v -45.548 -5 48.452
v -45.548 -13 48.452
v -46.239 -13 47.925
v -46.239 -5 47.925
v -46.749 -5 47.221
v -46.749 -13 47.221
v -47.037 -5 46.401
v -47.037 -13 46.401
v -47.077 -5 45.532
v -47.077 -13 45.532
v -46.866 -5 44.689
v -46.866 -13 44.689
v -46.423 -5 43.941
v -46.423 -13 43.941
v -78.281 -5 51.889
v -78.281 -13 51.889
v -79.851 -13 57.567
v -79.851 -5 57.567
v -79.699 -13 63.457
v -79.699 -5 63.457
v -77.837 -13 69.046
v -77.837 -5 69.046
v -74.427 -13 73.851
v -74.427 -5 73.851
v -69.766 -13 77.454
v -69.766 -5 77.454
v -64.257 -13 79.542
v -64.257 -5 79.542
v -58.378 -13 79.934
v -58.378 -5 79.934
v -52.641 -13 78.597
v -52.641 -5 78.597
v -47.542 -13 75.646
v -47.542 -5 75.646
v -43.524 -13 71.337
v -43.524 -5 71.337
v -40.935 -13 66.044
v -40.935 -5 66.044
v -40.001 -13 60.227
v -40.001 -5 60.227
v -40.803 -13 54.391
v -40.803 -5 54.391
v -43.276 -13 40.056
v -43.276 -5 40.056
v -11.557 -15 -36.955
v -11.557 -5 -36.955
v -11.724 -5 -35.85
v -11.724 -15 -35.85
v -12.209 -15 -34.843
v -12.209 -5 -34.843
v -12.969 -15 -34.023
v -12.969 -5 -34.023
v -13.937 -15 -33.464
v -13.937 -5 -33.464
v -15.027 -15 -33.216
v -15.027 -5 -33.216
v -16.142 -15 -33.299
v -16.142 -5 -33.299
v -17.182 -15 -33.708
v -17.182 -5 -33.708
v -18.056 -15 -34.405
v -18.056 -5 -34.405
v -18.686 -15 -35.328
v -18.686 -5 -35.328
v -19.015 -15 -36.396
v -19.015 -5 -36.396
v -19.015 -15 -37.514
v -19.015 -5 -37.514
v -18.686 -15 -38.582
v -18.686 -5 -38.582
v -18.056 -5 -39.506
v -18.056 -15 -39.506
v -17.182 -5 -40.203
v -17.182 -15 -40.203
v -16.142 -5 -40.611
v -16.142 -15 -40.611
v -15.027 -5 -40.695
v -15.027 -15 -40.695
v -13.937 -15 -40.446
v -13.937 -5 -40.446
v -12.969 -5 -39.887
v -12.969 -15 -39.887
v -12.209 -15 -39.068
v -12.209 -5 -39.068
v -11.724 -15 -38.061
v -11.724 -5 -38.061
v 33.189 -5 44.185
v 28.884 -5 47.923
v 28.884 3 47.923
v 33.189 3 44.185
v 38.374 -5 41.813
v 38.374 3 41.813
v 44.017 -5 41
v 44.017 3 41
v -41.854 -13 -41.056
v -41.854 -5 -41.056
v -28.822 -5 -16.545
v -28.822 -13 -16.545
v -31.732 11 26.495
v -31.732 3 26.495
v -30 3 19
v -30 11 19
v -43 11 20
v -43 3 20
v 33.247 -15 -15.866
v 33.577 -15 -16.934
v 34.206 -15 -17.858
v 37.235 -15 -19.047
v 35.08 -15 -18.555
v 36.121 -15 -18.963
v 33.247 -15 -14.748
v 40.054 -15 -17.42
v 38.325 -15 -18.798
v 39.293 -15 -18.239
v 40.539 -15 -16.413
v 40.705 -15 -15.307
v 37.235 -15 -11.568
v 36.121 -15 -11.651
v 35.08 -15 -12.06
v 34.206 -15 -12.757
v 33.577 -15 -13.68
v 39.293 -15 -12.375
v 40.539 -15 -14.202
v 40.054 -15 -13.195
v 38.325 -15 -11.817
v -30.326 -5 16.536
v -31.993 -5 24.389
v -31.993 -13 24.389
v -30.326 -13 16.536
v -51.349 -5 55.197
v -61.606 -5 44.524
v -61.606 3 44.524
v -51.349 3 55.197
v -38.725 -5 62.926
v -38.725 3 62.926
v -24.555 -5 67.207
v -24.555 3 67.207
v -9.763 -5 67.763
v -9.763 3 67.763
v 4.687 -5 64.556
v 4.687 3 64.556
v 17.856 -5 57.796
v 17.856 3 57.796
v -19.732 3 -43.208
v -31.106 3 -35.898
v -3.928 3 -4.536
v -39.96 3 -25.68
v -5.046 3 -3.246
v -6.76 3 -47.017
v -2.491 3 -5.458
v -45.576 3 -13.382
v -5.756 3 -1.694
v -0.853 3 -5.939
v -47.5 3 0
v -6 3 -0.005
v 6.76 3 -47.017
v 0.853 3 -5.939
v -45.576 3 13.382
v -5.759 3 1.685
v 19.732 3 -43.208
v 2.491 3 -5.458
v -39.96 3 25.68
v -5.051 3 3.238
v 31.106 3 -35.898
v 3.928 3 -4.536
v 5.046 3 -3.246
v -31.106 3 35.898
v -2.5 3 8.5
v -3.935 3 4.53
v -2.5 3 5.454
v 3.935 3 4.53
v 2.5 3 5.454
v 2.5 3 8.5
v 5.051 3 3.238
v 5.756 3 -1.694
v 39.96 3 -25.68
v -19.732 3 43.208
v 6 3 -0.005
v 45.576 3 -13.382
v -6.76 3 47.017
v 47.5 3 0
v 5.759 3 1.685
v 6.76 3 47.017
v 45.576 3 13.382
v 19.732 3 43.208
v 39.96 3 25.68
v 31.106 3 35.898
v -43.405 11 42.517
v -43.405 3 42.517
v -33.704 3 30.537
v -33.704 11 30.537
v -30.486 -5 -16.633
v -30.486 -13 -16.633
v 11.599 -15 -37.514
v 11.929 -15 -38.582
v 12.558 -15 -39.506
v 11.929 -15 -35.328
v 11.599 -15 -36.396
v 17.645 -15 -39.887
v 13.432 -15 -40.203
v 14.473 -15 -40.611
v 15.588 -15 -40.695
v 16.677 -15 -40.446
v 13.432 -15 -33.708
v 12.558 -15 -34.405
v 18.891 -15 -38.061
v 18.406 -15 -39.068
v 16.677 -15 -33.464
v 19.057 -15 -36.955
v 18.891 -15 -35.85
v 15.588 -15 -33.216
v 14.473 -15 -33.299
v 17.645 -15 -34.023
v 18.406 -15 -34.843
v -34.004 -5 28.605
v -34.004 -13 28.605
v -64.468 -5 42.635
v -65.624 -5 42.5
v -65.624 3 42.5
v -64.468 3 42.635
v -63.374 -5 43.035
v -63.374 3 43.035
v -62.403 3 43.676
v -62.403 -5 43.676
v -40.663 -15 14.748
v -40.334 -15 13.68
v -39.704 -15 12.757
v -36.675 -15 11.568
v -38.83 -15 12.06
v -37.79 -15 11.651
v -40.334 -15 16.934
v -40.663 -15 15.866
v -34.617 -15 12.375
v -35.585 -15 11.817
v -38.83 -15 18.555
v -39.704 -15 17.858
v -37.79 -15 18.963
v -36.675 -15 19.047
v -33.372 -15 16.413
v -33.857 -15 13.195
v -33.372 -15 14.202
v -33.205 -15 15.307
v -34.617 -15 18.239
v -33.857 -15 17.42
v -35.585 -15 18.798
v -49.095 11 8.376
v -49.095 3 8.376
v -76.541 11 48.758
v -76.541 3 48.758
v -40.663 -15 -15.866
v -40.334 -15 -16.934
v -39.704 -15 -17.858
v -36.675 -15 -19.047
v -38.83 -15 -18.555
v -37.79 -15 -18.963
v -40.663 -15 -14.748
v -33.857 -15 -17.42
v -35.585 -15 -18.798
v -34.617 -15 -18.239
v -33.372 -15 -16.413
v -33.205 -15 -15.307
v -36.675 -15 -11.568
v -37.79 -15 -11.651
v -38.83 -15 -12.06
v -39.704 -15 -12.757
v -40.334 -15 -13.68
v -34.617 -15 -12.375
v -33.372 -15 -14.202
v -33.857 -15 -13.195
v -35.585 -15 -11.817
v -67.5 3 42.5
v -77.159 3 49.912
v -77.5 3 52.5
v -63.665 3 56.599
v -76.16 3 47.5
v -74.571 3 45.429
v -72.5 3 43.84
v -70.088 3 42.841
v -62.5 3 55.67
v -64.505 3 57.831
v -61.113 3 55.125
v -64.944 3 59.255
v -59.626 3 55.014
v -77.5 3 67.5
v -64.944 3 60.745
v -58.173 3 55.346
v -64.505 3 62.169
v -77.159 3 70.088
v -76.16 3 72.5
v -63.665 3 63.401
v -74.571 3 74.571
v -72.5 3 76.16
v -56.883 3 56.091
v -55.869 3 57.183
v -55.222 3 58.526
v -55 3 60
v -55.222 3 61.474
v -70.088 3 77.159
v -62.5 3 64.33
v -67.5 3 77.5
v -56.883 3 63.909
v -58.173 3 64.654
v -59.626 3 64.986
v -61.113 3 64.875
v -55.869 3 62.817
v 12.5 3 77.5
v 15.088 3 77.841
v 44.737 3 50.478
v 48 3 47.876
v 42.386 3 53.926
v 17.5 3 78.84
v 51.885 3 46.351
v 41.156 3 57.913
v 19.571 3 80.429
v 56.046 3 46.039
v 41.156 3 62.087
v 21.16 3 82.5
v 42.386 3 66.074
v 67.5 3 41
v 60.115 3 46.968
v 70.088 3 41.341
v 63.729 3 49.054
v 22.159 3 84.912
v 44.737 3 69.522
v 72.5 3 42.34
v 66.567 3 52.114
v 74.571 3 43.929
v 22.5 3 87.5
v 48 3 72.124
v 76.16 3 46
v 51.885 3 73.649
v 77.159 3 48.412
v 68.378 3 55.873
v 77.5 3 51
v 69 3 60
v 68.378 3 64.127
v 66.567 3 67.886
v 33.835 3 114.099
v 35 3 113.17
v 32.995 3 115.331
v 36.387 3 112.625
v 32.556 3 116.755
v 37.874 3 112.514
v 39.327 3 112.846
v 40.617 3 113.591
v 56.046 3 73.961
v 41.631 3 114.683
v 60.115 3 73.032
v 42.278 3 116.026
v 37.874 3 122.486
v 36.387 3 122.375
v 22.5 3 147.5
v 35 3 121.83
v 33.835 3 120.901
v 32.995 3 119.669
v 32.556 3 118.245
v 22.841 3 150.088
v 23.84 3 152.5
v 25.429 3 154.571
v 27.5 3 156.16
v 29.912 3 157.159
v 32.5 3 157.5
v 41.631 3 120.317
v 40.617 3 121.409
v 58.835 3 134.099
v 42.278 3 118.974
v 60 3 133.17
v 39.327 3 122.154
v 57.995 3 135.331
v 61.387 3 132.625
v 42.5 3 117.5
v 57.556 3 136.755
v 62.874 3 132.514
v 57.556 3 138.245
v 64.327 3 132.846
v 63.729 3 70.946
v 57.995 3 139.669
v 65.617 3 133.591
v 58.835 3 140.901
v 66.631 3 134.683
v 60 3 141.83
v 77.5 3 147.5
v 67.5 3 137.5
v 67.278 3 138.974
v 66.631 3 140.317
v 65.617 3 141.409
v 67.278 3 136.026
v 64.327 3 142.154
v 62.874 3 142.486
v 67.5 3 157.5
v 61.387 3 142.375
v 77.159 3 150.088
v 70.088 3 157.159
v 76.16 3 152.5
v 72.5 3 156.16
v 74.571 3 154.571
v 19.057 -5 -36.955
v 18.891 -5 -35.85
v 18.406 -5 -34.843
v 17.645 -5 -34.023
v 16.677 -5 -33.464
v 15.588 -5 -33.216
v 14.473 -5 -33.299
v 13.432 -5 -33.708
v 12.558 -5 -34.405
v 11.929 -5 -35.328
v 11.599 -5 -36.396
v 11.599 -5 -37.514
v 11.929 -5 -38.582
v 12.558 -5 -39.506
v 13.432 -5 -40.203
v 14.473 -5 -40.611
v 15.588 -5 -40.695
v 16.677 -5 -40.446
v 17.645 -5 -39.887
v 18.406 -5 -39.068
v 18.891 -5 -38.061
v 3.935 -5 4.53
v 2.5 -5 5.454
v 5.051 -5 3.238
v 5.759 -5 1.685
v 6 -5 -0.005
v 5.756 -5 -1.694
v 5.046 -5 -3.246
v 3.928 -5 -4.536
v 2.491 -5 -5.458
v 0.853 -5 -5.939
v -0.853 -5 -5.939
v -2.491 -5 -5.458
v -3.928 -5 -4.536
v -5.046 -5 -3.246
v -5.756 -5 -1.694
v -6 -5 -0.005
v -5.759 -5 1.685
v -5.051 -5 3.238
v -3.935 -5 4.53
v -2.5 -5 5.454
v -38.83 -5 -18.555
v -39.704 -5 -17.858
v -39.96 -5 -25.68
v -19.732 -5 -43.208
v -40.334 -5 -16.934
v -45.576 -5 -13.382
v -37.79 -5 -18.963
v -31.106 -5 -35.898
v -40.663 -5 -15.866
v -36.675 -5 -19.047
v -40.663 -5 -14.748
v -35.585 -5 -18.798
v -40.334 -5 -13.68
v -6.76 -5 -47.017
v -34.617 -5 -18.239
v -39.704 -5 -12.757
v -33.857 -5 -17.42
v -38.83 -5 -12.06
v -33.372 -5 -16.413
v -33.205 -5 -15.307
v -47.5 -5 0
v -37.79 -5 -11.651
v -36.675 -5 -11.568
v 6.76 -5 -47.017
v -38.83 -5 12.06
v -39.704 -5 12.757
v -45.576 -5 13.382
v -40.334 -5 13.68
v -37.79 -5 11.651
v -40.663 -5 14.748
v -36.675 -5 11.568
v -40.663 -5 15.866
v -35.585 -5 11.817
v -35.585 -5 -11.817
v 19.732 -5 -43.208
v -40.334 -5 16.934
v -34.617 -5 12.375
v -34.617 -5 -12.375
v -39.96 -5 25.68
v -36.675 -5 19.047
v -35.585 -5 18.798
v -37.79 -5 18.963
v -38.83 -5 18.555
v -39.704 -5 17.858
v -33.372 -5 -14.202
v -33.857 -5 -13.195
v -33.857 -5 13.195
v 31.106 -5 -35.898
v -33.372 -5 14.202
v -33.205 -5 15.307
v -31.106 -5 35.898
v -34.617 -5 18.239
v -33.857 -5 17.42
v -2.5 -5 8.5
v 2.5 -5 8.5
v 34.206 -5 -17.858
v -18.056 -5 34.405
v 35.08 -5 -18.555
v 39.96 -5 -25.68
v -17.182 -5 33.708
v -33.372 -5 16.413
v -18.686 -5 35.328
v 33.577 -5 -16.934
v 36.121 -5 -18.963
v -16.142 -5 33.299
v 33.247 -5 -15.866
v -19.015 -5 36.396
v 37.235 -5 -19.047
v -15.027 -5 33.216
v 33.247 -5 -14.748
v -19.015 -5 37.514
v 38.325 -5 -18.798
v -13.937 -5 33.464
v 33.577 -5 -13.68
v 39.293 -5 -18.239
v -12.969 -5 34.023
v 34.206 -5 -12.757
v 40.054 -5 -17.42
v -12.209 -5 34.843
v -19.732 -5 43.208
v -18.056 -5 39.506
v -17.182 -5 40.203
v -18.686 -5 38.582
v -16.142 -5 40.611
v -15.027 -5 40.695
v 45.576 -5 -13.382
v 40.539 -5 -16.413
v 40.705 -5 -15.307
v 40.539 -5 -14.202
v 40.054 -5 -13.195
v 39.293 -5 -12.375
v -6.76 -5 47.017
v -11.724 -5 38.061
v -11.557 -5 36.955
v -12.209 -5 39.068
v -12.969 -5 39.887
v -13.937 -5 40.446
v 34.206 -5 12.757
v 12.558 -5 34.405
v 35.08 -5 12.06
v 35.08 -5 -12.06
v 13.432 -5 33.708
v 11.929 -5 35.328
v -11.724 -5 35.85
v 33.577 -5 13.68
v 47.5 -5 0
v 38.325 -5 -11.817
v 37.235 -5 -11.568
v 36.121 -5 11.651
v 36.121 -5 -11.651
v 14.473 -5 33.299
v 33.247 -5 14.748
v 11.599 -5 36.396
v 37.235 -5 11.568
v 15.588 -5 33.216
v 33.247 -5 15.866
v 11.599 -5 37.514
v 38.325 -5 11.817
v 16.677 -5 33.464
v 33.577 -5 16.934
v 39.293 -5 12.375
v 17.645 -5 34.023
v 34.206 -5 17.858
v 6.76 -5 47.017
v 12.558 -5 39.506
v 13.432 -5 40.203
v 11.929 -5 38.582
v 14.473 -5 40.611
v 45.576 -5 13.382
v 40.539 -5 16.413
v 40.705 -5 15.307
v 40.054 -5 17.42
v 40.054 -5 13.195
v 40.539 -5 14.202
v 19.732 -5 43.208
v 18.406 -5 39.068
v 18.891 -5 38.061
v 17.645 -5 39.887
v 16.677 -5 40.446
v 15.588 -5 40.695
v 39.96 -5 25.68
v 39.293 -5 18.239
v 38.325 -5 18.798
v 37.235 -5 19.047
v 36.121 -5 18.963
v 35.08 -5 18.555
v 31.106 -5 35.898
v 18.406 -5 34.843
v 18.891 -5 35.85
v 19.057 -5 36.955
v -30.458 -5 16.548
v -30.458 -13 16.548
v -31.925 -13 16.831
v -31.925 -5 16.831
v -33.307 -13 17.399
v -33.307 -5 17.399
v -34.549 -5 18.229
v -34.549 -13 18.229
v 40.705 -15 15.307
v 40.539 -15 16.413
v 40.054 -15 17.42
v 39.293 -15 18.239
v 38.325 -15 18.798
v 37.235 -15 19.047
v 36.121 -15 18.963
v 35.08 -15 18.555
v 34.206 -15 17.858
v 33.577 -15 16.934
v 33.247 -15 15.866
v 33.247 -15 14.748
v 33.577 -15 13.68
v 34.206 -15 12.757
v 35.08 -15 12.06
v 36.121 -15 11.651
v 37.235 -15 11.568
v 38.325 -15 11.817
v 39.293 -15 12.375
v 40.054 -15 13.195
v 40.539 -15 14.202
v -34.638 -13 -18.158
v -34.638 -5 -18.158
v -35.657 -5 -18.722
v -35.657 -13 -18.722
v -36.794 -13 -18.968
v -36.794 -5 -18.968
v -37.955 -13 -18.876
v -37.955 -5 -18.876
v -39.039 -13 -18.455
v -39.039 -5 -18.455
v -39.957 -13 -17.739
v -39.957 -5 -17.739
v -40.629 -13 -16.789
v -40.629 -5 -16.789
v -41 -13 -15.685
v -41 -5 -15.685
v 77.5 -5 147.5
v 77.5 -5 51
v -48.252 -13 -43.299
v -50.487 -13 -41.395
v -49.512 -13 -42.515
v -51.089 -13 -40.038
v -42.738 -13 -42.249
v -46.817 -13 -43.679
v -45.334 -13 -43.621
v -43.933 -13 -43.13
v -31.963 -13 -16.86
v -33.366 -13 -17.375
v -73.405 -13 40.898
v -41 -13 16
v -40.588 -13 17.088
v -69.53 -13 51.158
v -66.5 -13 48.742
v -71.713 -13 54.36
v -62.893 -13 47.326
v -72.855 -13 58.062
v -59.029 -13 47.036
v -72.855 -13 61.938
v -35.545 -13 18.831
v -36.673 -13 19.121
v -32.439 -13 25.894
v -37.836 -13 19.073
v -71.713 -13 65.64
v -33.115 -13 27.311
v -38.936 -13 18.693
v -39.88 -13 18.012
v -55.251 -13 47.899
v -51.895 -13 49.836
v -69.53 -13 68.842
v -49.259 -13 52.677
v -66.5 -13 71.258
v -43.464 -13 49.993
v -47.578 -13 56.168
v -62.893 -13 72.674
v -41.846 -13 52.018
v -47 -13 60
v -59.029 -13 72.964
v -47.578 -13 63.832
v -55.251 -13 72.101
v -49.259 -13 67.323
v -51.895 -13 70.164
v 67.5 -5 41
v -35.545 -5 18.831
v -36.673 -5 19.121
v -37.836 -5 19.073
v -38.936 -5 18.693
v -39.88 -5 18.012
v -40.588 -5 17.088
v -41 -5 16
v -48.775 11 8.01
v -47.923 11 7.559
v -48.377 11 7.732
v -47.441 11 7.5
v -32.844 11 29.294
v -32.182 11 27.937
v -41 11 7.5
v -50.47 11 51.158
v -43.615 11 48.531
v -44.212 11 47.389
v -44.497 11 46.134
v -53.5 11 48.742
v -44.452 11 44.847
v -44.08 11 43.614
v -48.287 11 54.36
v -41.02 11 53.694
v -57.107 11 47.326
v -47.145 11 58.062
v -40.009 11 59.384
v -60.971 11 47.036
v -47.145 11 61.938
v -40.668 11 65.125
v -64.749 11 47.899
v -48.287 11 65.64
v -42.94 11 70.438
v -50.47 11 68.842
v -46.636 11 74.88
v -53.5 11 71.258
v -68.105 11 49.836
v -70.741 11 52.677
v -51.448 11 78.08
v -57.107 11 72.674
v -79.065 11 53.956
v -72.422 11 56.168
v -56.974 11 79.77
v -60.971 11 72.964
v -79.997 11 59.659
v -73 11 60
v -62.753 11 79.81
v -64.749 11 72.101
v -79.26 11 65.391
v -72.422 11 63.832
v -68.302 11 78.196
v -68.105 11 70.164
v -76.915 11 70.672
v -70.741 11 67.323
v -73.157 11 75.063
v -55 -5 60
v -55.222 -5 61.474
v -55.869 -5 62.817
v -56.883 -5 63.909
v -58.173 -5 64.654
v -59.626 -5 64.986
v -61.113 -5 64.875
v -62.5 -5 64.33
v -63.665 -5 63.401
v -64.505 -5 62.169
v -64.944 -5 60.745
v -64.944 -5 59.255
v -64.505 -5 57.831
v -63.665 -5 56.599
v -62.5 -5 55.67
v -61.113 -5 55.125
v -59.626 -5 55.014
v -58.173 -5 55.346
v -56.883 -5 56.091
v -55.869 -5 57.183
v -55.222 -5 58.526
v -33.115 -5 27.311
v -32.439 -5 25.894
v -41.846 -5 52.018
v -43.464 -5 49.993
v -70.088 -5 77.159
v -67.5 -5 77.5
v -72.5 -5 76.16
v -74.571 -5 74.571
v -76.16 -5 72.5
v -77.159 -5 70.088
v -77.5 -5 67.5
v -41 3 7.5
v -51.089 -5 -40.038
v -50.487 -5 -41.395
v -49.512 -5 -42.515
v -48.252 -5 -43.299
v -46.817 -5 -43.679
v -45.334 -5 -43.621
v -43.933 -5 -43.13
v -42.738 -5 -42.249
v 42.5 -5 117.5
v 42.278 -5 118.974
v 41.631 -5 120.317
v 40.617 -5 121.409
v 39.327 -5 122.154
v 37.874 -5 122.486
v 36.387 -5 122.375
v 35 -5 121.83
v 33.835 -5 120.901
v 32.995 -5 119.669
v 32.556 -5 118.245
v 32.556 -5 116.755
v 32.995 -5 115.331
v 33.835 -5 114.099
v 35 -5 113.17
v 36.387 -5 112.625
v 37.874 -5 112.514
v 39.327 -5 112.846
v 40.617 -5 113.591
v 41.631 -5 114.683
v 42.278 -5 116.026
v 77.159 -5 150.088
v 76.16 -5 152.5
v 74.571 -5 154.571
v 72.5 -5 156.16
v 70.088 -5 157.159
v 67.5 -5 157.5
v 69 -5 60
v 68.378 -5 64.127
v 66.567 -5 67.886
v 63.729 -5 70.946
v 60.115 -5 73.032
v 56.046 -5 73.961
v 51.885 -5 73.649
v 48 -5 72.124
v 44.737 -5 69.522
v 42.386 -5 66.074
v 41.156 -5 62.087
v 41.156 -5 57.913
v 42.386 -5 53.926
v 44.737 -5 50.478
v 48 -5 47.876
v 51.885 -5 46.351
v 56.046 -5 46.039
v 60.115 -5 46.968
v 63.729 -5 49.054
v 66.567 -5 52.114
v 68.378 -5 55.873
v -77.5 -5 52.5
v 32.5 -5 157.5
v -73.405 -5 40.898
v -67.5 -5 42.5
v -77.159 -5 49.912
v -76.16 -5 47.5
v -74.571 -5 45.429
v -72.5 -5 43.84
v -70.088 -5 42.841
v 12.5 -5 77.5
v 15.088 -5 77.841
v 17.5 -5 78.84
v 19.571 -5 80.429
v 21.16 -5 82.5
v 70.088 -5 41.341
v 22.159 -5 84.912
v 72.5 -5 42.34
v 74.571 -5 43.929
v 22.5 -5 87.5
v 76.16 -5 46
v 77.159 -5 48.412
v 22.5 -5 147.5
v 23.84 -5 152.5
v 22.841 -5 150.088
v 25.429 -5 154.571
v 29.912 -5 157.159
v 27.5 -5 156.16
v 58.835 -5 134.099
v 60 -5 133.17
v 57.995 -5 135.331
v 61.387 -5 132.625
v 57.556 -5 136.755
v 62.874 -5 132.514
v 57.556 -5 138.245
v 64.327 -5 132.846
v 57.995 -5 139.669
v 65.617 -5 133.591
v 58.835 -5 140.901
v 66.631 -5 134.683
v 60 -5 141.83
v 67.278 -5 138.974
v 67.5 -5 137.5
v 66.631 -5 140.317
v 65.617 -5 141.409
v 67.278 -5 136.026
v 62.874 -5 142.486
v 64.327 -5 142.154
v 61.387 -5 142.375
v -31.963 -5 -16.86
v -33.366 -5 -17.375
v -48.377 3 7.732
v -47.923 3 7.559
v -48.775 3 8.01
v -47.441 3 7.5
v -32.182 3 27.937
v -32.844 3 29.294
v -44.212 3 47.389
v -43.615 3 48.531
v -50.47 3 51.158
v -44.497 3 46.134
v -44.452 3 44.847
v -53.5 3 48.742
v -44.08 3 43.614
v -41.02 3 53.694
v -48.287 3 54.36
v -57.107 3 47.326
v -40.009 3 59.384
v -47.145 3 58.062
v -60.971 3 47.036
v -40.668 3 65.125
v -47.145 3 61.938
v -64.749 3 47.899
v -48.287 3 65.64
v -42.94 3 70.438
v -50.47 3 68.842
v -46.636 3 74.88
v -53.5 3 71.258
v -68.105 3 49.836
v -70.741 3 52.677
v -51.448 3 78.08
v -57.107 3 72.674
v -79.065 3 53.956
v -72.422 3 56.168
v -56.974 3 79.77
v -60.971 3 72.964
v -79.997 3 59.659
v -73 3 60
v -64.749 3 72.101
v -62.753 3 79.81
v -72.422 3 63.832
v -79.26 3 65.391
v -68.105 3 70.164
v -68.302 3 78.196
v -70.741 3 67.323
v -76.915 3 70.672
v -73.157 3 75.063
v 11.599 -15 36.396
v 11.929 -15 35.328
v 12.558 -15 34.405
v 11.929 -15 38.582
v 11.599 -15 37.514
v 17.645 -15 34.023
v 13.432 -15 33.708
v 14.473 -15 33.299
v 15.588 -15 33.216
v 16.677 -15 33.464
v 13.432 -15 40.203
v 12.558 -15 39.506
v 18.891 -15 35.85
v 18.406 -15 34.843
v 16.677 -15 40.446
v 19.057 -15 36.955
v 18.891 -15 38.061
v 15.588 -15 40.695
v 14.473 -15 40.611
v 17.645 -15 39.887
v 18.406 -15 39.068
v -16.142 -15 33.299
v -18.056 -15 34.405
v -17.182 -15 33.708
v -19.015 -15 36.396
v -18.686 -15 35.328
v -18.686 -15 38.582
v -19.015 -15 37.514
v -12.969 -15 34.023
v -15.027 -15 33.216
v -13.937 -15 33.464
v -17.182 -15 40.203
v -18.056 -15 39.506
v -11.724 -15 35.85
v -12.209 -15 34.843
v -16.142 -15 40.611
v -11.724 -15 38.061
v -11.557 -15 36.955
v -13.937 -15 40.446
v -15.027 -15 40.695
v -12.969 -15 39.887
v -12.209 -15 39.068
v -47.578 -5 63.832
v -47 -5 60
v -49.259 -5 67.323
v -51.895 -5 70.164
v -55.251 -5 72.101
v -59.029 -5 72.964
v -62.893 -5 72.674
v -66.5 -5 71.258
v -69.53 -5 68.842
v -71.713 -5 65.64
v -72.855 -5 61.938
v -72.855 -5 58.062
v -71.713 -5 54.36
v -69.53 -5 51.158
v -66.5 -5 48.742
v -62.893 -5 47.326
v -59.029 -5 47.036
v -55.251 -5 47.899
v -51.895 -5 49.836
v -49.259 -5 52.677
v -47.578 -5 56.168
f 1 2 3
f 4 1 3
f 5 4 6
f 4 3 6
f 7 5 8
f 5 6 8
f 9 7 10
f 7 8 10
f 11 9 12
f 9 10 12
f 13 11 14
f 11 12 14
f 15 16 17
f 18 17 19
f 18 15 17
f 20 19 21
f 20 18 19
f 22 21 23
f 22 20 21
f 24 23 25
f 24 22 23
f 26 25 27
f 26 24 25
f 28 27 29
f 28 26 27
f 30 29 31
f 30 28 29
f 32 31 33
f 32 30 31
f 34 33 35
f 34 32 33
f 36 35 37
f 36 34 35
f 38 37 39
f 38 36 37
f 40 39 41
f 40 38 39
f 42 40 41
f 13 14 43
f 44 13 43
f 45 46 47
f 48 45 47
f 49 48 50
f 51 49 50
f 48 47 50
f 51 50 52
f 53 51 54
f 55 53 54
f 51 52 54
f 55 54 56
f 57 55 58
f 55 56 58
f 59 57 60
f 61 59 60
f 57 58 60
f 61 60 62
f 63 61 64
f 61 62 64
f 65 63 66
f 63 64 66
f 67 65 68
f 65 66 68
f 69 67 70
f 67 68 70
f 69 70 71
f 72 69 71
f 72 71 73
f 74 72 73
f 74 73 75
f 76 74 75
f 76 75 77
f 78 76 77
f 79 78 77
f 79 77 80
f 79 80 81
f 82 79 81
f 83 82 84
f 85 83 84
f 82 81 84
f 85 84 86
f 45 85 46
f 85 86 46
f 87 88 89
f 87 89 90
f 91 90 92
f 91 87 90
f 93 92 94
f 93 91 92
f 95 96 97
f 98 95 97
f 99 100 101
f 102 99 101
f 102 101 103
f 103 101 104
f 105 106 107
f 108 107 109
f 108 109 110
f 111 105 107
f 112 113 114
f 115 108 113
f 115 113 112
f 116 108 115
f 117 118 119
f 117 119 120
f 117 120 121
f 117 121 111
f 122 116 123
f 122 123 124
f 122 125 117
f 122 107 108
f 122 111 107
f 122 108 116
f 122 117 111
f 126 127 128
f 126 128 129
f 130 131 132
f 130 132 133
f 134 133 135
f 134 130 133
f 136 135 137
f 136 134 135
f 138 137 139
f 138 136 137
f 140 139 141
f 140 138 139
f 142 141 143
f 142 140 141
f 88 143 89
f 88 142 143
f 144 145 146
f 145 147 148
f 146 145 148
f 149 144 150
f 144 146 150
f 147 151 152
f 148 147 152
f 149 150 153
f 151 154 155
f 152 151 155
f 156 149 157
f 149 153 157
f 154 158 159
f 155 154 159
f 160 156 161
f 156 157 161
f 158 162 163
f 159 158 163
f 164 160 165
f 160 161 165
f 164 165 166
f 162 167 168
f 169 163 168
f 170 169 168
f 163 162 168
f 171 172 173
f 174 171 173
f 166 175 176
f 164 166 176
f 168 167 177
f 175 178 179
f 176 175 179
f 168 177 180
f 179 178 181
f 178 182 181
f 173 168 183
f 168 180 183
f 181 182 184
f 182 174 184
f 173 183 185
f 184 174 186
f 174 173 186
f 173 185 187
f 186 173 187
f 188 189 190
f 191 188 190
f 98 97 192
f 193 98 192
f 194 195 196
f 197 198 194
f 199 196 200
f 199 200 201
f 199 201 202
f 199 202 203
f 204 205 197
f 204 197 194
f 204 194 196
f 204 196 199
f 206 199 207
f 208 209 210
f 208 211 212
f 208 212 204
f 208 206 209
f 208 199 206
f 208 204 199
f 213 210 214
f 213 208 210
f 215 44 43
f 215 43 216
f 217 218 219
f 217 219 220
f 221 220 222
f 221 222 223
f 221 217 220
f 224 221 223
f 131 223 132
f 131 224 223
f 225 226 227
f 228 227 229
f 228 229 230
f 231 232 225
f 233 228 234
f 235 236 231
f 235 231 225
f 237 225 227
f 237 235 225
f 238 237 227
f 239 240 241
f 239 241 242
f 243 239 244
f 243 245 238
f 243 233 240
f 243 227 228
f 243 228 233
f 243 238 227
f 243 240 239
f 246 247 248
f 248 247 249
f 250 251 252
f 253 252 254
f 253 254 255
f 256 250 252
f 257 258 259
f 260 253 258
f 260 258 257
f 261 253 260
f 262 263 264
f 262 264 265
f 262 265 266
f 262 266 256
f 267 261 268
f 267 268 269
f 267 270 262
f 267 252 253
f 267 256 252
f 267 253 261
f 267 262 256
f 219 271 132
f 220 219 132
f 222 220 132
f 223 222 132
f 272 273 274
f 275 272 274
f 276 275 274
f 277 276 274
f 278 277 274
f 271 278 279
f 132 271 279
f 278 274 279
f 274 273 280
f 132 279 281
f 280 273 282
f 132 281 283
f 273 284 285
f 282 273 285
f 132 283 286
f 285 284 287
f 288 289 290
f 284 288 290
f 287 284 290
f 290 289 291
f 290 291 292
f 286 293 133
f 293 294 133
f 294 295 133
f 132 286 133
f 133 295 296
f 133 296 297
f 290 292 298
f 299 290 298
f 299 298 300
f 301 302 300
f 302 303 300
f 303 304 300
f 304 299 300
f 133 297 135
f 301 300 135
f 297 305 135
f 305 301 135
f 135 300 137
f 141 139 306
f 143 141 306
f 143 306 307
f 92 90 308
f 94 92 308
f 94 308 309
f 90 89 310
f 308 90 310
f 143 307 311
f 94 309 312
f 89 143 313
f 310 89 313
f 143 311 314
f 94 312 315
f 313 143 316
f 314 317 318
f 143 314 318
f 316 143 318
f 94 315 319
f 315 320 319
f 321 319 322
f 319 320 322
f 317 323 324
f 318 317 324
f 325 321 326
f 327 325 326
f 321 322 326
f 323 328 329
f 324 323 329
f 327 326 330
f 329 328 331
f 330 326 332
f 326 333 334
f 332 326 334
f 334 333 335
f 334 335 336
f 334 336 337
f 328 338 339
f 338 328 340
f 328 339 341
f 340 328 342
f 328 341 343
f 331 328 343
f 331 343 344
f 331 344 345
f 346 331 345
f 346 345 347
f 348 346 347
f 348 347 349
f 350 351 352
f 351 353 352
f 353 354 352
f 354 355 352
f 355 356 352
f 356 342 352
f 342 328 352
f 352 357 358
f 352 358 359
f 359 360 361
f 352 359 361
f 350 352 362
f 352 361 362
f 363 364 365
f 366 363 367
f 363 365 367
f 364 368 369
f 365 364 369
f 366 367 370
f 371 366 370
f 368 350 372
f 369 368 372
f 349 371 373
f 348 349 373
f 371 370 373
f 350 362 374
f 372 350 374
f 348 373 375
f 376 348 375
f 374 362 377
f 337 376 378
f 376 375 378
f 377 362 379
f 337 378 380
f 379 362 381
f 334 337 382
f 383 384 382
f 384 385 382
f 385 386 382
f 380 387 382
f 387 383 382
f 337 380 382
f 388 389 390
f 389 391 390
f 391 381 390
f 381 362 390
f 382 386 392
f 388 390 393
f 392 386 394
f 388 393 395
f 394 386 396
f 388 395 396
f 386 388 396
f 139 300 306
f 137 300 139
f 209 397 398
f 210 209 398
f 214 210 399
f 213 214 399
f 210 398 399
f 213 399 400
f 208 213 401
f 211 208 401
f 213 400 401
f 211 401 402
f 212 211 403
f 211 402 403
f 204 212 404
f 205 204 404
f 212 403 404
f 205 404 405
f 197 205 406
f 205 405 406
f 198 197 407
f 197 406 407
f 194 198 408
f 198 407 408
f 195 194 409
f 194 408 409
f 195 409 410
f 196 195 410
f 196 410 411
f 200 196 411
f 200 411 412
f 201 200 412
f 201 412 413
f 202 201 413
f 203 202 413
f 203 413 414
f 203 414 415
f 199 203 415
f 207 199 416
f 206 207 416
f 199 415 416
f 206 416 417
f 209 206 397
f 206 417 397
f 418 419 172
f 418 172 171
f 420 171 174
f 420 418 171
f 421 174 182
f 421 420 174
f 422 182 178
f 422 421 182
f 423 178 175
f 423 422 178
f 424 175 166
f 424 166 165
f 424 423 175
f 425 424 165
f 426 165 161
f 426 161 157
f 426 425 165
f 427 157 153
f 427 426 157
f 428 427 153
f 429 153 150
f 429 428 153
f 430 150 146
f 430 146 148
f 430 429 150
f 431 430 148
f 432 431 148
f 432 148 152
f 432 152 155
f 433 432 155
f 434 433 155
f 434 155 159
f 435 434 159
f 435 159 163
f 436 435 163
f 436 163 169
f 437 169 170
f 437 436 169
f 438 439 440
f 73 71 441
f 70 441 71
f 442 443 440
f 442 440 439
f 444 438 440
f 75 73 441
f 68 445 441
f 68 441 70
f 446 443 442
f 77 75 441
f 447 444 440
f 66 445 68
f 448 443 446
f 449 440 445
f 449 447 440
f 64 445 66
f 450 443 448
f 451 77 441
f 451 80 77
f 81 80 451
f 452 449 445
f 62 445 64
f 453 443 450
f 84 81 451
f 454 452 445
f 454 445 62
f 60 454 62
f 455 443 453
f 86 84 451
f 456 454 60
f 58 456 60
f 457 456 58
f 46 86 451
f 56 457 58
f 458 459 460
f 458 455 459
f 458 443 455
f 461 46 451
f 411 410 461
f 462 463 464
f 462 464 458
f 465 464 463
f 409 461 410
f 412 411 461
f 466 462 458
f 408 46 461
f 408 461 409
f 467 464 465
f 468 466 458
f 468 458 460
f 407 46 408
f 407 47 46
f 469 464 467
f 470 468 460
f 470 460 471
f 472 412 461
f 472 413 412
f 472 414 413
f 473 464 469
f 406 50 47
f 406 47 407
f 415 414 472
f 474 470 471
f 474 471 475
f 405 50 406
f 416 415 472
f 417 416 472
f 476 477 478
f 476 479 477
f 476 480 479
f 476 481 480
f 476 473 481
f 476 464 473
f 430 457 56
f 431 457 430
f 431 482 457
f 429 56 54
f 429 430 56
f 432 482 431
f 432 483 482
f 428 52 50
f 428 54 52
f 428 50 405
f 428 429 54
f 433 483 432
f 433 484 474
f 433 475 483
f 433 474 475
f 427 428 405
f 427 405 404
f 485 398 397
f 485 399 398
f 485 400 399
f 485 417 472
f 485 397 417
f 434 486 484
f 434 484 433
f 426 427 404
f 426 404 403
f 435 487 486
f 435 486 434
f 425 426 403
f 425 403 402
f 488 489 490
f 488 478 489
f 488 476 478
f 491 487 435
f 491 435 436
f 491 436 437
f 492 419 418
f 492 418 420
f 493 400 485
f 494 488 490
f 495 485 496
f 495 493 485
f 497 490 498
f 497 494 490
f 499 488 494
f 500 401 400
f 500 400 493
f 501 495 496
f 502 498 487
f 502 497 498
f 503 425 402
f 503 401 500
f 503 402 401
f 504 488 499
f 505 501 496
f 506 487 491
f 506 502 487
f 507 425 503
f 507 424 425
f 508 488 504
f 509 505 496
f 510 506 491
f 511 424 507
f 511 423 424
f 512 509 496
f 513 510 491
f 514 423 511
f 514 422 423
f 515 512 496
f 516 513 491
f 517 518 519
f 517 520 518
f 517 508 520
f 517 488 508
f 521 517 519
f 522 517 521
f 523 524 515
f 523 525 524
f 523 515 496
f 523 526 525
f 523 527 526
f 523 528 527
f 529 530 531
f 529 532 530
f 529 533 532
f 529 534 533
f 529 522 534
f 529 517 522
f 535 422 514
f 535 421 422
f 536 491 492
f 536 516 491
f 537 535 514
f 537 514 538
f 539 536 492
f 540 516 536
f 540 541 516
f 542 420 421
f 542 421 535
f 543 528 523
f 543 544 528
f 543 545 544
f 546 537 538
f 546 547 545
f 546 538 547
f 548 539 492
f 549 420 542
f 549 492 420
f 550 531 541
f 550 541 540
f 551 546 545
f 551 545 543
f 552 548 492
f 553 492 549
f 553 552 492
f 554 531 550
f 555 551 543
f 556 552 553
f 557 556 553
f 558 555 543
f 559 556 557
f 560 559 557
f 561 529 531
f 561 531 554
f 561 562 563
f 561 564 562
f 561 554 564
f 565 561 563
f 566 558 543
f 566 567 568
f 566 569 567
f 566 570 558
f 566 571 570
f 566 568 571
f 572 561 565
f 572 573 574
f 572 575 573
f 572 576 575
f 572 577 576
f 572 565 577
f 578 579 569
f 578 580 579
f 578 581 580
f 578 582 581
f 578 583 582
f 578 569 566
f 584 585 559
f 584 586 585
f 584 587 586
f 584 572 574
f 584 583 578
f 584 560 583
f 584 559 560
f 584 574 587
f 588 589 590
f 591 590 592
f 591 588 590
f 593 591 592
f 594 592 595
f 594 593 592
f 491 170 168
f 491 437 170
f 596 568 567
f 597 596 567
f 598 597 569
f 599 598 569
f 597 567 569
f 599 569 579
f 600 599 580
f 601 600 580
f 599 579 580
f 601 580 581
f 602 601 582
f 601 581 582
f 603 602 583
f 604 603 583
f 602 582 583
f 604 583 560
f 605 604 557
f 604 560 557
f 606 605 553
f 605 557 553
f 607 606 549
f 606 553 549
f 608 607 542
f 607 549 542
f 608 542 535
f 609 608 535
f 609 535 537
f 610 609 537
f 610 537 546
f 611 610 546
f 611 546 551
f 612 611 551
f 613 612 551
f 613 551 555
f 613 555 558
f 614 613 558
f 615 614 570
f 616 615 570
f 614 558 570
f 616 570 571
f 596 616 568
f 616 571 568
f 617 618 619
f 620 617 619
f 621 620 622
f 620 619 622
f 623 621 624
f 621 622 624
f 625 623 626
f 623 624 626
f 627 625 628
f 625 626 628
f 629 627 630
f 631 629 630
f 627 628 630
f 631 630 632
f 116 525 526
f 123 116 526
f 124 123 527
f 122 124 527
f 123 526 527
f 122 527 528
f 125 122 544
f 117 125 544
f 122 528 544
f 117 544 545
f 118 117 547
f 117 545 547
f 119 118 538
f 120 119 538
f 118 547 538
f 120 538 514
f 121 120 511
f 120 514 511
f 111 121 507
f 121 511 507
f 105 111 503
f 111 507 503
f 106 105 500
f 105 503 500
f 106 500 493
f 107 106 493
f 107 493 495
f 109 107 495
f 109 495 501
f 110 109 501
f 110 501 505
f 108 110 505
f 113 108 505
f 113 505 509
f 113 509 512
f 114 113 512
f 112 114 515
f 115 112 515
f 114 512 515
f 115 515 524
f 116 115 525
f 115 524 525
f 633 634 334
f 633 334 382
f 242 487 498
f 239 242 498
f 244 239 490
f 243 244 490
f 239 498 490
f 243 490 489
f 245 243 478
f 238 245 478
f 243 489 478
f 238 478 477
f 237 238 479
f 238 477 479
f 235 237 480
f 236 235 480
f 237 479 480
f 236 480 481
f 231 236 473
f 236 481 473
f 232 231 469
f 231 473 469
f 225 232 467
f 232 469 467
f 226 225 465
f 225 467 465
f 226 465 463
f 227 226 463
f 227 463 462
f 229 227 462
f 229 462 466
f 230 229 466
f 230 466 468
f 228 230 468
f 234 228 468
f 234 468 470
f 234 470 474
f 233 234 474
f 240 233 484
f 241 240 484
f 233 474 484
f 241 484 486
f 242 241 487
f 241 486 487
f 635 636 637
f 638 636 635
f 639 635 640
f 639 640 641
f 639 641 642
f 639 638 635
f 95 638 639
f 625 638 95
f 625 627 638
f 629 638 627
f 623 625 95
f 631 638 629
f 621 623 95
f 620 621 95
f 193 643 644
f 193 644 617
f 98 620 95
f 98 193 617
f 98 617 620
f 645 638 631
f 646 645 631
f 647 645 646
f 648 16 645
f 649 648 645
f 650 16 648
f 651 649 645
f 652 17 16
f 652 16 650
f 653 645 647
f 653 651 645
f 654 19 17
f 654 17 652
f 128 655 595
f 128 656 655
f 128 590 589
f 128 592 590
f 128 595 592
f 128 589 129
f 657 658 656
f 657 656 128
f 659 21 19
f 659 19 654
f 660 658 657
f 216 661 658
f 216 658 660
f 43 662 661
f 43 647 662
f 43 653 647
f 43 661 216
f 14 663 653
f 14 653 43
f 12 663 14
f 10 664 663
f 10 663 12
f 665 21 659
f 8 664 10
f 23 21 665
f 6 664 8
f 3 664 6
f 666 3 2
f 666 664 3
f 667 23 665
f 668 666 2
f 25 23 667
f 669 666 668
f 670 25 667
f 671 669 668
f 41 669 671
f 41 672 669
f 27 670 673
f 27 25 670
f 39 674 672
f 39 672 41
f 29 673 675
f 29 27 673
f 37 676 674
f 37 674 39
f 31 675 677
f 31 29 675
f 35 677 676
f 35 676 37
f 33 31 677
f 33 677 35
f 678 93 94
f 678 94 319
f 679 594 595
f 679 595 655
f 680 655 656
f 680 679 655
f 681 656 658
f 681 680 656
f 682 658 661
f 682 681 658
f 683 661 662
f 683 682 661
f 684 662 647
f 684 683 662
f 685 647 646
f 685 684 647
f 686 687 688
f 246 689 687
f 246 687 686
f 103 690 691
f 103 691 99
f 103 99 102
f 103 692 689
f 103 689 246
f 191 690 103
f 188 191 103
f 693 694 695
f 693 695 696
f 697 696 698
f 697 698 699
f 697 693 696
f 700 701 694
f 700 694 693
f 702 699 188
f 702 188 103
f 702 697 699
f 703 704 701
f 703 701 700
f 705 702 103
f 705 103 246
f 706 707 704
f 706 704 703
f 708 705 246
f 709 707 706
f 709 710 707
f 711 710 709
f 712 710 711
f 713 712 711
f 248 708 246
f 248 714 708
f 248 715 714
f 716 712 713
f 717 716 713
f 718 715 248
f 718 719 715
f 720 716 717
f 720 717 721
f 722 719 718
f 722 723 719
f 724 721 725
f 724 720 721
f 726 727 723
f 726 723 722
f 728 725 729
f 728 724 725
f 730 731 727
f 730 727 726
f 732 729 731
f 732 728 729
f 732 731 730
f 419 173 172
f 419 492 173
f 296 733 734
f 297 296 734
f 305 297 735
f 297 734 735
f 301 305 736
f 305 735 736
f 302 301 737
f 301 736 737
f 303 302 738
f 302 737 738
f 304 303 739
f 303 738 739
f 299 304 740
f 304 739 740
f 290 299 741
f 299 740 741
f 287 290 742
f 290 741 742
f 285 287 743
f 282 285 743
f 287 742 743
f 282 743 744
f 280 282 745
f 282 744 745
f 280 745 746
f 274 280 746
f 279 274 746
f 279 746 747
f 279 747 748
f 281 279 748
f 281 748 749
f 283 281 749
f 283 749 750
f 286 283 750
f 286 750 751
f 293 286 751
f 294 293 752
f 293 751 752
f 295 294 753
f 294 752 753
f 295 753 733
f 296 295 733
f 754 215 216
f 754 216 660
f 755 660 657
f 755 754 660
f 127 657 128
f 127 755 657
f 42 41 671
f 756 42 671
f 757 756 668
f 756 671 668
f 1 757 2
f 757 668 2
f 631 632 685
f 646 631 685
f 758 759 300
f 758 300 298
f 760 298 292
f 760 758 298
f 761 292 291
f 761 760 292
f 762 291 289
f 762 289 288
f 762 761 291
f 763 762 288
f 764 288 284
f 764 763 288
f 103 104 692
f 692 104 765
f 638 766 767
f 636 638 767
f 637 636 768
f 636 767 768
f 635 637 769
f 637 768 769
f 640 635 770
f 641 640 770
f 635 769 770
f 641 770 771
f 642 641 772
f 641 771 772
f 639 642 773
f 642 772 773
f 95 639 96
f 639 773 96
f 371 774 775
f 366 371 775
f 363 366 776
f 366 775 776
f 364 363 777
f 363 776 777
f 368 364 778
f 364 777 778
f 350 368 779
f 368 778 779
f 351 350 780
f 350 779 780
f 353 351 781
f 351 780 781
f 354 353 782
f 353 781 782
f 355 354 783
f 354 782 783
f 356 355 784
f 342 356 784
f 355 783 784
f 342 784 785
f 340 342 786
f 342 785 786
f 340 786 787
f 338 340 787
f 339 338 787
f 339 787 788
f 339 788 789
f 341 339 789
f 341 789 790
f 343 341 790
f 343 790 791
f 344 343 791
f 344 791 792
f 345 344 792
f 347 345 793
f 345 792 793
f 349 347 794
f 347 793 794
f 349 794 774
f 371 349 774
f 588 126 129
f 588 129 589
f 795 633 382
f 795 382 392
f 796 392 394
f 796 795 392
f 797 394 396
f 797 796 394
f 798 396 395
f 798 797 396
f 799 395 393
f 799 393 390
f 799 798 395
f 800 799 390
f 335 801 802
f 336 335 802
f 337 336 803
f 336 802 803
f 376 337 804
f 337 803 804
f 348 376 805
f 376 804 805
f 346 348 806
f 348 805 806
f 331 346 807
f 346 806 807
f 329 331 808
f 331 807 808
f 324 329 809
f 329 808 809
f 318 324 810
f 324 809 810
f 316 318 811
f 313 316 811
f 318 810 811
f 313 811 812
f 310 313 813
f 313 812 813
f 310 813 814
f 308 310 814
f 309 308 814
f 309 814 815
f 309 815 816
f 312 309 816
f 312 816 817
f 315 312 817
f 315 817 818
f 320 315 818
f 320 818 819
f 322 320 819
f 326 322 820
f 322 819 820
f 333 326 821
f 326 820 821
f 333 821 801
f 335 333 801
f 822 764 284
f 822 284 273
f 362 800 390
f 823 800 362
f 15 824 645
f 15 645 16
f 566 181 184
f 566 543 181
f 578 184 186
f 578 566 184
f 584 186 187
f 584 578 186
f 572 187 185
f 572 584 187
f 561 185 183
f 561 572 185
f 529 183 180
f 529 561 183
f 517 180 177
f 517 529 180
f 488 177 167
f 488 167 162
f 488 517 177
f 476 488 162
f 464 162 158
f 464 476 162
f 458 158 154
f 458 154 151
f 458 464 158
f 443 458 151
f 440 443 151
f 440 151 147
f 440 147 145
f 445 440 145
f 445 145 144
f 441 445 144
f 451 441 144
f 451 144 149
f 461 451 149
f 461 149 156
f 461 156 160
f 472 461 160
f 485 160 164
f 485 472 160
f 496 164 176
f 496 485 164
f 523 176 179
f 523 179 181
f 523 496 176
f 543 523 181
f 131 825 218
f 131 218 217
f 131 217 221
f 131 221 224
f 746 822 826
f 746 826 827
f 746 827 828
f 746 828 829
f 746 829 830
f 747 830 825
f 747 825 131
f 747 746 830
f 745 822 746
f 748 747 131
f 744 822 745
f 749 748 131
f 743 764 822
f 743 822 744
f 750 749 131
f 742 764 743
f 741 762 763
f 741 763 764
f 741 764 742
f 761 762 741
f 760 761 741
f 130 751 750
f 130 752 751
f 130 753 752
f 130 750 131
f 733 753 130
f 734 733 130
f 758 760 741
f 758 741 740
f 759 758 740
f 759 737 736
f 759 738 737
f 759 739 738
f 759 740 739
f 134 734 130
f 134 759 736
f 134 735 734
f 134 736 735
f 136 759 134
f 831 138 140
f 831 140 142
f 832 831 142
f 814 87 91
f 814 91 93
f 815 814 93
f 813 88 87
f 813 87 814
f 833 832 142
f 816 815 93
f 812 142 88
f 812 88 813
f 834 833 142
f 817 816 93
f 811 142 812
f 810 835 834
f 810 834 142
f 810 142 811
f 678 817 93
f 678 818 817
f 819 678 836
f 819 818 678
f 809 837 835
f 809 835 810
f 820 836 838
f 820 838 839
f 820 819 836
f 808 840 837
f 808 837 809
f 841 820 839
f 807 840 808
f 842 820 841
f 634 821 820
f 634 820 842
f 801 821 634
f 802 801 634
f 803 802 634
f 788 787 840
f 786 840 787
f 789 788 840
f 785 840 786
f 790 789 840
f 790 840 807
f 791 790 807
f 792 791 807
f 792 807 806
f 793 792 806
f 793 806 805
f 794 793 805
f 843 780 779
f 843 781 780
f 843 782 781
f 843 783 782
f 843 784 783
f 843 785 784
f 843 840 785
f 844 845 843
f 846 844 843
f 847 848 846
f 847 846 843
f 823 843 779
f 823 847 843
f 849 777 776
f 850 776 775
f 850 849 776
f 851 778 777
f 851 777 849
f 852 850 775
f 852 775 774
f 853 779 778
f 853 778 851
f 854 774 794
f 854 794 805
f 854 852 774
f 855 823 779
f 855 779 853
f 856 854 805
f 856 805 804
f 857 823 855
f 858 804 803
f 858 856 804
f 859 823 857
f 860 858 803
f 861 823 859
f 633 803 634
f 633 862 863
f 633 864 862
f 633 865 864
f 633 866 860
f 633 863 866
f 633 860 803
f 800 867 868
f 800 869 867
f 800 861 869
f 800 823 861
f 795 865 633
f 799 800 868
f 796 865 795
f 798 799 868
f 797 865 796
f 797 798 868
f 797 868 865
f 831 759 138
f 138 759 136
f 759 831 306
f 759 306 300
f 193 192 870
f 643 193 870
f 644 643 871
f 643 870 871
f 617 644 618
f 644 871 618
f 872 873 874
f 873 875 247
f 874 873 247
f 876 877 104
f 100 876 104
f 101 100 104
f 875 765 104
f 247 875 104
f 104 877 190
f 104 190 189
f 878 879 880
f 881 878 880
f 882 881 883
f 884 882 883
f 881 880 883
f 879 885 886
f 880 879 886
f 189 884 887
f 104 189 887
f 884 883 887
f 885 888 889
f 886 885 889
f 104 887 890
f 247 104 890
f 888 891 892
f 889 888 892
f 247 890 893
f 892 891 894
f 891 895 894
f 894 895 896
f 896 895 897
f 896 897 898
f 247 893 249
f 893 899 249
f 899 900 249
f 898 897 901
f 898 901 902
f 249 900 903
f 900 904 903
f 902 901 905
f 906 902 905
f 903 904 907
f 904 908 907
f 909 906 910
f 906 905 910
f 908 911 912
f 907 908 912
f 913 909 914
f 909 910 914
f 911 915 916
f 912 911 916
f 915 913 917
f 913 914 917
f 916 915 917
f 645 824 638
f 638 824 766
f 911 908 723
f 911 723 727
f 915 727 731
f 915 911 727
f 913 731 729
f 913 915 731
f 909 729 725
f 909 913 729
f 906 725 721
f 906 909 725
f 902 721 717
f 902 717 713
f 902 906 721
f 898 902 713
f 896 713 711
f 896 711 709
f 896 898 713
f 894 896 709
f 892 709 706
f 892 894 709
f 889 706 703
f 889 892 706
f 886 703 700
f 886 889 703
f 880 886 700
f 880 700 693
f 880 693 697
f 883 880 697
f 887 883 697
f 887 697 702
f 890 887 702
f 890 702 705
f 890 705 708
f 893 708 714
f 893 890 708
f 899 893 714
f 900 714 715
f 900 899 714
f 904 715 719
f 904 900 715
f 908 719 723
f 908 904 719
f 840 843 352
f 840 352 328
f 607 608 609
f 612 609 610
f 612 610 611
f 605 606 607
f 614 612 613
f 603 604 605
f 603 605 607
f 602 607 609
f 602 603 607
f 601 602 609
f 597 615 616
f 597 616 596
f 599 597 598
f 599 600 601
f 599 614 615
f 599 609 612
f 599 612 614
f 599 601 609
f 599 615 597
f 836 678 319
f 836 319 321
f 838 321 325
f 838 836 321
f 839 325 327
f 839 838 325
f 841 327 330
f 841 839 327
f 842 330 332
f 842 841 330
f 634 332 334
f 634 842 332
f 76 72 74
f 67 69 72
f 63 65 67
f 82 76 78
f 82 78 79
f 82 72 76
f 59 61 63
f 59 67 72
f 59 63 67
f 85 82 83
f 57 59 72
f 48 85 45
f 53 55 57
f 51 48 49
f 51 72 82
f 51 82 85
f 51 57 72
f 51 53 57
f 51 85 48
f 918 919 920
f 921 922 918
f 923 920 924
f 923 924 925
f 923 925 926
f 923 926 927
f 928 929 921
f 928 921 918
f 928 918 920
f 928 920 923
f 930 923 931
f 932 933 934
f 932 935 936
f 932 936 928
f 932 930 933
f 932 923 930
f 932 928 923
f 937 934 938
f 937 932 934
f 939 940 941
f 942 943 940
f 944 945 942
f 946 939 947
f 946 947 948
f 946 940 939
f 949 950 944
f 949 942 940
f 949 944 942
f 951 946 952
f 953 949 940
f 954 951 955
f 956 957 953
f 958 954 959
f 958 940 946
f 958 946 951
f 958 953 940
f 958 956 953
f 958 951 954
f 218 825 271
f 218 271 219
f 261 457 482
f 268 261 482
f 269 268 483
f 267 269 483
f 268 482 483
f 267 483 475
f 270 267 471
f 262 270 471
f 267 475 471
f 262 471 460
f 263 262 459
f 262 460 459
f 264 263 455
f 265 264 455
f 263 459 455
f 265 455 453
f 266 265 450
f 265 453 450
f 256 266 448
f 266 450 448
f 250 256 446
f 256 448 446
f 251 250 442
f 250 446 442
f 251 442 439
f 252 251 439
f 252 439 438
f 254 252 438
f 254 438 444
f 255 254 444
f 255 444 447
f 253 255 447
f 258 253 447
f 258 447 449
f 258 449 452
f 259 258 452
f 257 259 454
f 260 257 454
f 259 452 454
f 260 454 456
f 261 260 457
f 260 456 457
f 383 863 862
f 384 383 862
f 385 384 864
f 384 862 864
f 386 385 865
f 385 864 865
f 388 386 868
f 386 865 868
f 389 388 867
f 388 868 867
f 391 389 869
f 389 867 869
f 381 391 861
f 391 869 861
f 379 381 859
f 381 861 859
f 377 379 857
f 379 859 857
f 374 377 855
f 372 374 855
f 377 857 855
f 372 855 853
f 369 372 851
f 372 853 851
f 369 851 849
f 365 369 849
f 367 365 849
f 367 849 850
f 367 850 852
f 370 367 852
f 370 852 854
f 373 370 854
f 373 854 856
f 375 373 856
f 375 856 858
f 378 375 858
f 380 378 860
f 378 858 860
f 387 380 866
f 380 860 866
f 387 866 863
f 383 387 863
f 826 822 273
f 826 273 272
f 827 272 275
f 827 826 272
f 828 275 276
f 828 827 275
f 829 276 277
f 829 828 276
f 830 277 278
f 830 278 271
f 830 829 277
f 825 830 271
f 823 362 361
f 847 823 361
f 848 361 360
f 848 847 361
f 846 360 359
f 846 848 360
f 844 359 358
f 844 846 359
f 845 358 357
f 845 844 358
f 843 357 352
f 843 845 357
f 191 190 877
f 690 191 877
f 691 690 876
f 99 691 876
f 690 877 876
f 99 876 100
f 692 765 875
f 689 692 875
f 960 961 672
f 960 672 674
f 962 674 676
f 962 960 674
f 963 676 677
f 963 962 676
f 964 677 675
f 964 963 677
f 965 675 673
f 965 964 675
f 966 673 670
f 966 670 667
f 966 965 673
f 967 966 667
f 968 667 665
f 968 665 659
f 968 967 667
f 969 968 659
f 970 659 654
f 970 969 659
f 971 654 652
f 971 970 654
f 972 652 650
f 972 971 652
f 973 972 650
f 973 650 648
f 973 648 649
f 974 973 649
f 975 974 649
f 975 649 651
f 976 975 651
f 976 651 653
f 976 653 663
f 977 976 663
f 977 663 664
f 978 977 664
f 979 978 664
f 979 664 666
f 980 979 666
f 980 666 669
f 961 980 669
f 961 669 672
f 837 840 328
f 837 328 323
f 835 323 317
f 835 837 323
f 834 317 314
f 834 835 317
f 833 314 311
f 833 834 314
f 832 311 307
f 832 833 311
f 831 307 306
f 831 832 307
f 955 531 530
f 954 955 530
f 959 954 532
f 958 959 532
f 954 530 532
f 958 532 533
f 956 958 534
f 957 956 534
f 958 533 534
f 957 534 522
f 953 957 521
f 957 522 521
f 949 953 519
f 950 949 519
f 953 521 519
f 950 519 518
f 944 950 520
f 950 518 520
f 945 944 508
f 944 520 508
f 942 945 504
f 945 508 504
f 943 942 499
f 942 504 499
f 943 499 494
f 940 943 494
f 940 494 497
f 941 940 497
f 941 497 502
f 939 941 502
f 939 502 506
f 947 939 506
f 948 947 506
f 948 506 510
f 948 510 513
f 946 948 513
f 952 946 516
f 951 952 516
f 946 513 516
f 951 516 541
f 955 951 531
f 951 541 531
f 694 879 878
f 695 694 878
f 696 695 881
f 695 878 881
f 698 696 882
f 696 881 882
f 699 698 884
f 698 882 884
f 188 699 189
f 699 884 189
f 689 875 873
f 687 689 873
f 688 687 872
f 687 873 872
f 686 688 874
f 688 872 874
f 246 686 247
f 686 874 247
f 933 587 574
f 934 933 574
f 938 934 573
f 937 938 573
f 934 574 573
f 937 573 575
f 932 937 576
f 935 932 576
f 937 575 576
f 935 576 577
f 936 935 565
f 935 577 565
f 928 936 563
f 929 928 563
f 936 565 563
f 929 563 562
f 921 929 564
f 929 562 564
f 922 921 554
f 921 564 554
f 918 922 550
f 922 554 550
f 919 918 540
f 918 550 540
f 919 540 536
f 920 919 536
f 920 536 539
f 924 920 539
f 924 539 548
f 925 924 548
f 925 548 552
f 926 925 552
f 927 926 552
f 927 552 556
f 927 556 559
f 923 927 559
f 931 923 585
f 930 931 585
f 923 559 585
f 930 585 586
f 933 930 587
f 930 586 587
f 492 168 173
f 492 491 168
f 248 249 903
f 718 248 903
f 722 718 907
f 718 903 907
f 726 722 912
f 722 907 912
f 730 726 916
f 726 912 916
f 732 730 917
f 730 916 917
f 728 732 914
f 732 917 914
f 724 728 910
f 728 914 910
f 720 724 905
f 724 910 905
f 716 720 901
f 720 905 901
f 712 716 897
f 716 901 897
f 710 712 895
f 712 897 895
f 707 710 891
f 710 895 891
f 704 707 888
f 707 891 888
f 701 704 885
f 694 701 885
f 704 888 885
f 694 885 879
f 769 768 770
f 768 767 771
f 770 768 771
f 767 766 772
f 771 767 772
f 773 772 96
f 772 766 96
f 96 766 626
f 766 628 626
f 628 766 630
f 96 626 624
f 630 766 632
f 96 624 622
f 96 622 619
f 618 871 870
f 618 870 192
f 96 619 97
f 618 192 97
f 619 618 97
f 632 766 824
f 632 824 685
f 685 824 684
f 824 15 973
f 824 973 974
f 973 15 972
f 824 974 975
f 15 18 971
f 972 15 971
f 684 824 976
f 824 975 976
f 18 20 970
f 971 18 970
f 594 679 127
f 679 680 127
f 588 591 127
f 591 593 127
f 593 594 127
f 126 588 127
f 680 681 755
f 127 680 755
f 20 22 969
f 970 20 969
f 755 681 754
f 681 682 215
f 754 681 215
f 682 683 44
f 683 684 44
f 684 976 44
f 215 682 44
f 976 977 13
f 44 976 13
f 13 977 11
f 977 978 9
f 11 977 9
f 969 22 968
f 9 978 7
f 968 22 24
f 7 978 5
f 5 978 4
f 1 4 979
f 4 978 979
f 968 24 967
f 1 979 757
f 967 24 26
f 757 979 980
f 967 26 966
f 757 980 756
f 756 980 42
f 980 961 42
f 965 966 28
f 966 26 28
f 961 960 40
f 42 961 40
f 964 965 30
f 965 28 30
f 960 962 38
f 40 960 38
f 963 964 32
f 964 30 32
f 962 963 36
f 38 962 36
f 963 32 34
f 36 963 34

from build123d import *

# Parameters (mm, degrees)
F0_R          = 47.5
F1_DEPTH      = 5
F1_DEPTH_BACK = 3
F2_R          = 3.75
F3_DEPTH      = 10
F5_R          = 5
F5_R_2        = 14
F6_DEPTH      = 8
F7_R          = 13
F8_DEPTH      = 8
F11_R         = 13
F12_DEPTH     = 8
F13_R         = 13
F14_DEPTH     = 8
F16_DEPTH     = 25


with BuildPart() as f1:
    # F0 (on Front) → F1 (new body, two sides)
    with BuildSketch(Plane.XZ) as f1_sk:
        Circle(F0_R)
        with BuildLine():
            ThreePointArc((2.5, 5.4543560573), (0, -6), (-2.5, 5.4543560573))
            Line((-2.5, 5.4543560573), (-2.5, 8.5))
            Line((-2.5, 8.5), (2.5, 8.5))
            Line((2.5, 8.5), (2.5, 5.4543560573))
        make_face(mode=Mode.SUBTRACT)
    extrude(amount=F1_DEPTH)
    extrude(f1_sk.sketch, amount=-F1_DEPTH_BACK)

    # F2 (on face) → F3 (join)
    with BuildSketch(Plane.XZ.offset(5)):
        with Locations((15.3073372946, 36.9551813005)):
            Circle(F2_R)
        with Locations((-15.3073372946, 36.9551813005)):
            Circle(F2_R)
        with Locations((-36.9551813005, 15.3073372946)):
            Circle(F2_R)
        with Locations((-36.9551813005, -15.3073372946)):
            Circle(F2_R)
        with Locations((-15.3073372946, -36.9551813005)):
            Circle(F2_R)
        with Locations((15.3073372946, -36.9551813005)):
            Circle(F2_R)
        with Locations((36.9551813005, -15.3073372946)):
            Circle(F2_R)
        with Locations((36.9551813005, 15.3073372946)):
            Circle(F2_R)
    extrude(amount=F3_DEPTH)


with BuildPart() as f6:
    # F5 (on face) → F6 (new body)
    with BuildSketch(Plane.XZ.offset(5)):
        with BuildLine():
            ThreePointArc((32.5, 157.5), (25.4289321881, 154.5710678119), (22.5, 147.5))
            Line((22.5, 147.5), (22.5, 87.5))
            ThreePointArc((22.5, 87.5), (19.5710678119, 80.4289321881), (12.5, 77.5))
            Line((12.5, 77.5), (-67.5, 77.5))
            ThreePointArc((-67.5, 77.5), (-74.5710678119, 74.5710678119), (-77.5, 67.5))
            Line((-77.5, 67.5), (-77.5, 52.5))
            ThreePointArc((-77.5, 52.5), (-74.5710678119, 45.4289321881), (-67.5, 42.5))
            Line((-67.5, 42.5), (-65.6236110921, 42.5))
            ThreePointArc((-65.6236110921, 42.5), (-63.374272565, 43.0345239682), (-61.60586418, 44.5238095238))
            ThreePointArc((-61.60586418, 44.5238095238), (-17.1772348514, 67.9591204937), (28.884396278, 47.9230769231))
            ThreePointArc((28.884396278, 47.9230769231), (35.6964437753, 42.8129378192), (44.0169467187, 41))
            Line((44.0169467187, 41), (67.5, 41))
            ThreePointArc((67.5, 41), (74.5710678119, 43.9289321881), (77.5, 51))
            Line((77.5, 51), (77.5, 147.5))
            ThreePointArc((77.5, 147.5), (74.5710678119, 154.5710678119), (67.5, 157.5))
            Line((67.5, 157.5), (32.5, 157.5))
        make_face()
        with Locations((-60, 60)):
            Circle(F5_R, mode=Mode.SUBTRACT)
        with Locations((55, 60)):
            Circle(F5_R_2, mode=Mode.SUBTRACT)
        with Locations((37.5, 117.5)):
            Circle(F5_R, mode=Mode.SUBTRACT)
        with Locations((62.5, 137.5)):
            Circle(F5_R, mode=Mode.SUBTRACT)
    extrude(amount=-F6_DEPTH)


with BuildPart() as f8:
    # F7 (on face) → F8 (new body)
    with BuildSketch(Plane.XZ.offset(5)):
        with BuildLine():
            Line((-45.5454252447, 5.6539239871), (-42.0390263481, 58.8153374007))
            ThreePointArc((-42.0390263481, 58.8153374007), (-61.8254025331, 77.9072026177), (-77.3525061409, 55.21559506))
            Line((-77.3525061409, 55.21559506), (-51.0893218746, -40.0380617645))
            ThreePointArc((-51.0893218746, -40.0380617645), (-46.817223508, -43.6789346076), (-41.8544433156, -41.0564182062))
            Line((-41.8544433156, -41.0564182062), (-28.8216980003, -16.5453891757))
            Line((-28.8216980003, -16.5453891757), (-30.4861678116, -16.6331144374))
            ThreePointArc((-30.4861678116, -16.6331144374), (-32.6771791019, -17.0825556032), (-34.638229912, -18.1581054885))
            ThreePointArc((-34.638229912, -18.1581054885), (-38.5124264489, -18.7052097863), (-41, -15.6851601597))
            Line((-41, -15.6851601597), (-41, -1.6851601597))
            Line((-41, -1.6851601597), (-45.5454252447, 5.6539239871))
        make_face()
        with Locations((-60, 60)):
            Circle(F7_R, mode=Mode.SUBTRACT)
    extrude(amount=F8_DEPTH)

    # F13 (on face) → F14 (join)
    with BuildSketch(Plane(origin=(0, -5, 0), x_dir=(-1, 0, 0), z_dir=(0, 1, 0))):
        with BuildLine():
            Line((48.8274879805, -14.4962734092), (78.2813984598, 51.8888675048))
            ThreePointArc((78.2813984598, 51.8888675048), (57.4771635507, 79.8402443596), (44.3303405904, 47.5717348762))
            ThreePointArc((44.3303405904, 47.5717348762), (45.4128615623, 44.4393357528), (44.2986555453, 41.31806664))
            Line((44.2986555453, 41.31806664), (34.003863851, 28.6050576495))
            ThreePointArc((34.003863851, 28.6050576495), (32.7489738734, 26.6159230972), (31.9933678596, 24.3887130319))
            Line((31.9933678596, 24.3887130319), (30.3260801171, 16.5358292403))
            Line((30.3260801171, 16.5358292403), (30.4577421115, 16.5477985125))
            ThreePointArc((30.4577421115, 16.5477985125), (32.6300949094, 17.0801622574), (34.5488643782, 18.2294453214))
            ThreePointArc((34.5488643782, 18.2294453214), (38.3994763606, 18.9233540189), (41, 16))
            Line((41, 16), (41, -15.6851601597))
            Line((41, -15.6851601597), (46.9993481346, -15.6851601597))
            ThreePointArc((46.9993481346, -15.6851601597), (48.0897089695, -15.3617976427), (48.8274879805, -14.4962734092))
        make_face()
        with Locations((60, 60)):
            Circle(F13_R, mode=Mode.SUBTRACT)
    extrude(amount=-F14_DEPTH)

    # F15 (on face) → F16 (cut)
    with BuildSketch(Plane.XZ.offset(13)):
        with BuildLine():
            Line((-46.4229721787, 43.9413792102), (-43.2763702235, 40.0556494029))
            Line((-43.2763702235, 40.0556494029), (-35.2763702235, 40.0556494029))
            Line((-35.2763702235, 40.0556494029), (-35.2763702235, 54.3906954695))
            Line((-35.2763702235, 54.3906954695), (-40.8027162681, 54.3906954695))
            ThreePointArc((-40.8027162681, 54.3906954695), (-42.5889409712, 50.953061449), (-45.5476474881, 48.4522651567))
            ThreePointArc((-45.5476474881, 48.4522651567), (-47.0365994546, 46.4008219683), (-46.4229721787, 43.9413792102))
        make_face()
    extrude(amount=-F16_DEPTH, mode=Mode.SUBTRACT)


with BuildPart() as f12:
    # F11 (on face) → F12 (new body)
    with BuildSketch(Plane(origin=(0, 3, 0), x_dir=(-1, 0, 0), z_dir=(0, 1, 0))):
        with BuildLine():
            Line((49.0952220718, 8.375765293), (76.5411496684, 48.7576529298))
            ThreePointArc((76.5411496684, 48.7576529298), (59.8622252185, 79.9995254471), (43.615307759, 48.530830014))
            ThreePointArc((43.615307759, 48.530830014), (44.5160762599, 45.4886803355), (43.404864506, 42.5169355623))
            Line((43.404864506, 42.5169355623), (33.7035274984, 30.536782077))
            ThreePointArc((33.7035274984, 30.536782077), (32.4874272694, 28.6280699339), (31.7316772086, 26.4947805356))
            Line((31.7316772086, 26.4947805356), (30, 19))
            Line((30, 19), (43, 20))
            Line((43, 20), (41, 7.5))
            Line((41, 7.5), (47.441107105, 7.5))
            ThreePointArc((47.441107105, 7.5), (48.3769304286, 7.7324495178), (49.0952220718, 8.375765293))
        make_face()
        with Locations((60, 60)):
            Circle(F11_R, mode=Mode.SUBTRACT)
    extrude(amount=F12_DEPTH)


solid = Compound([f1.part, f6.part, f8.part, f12.part])
